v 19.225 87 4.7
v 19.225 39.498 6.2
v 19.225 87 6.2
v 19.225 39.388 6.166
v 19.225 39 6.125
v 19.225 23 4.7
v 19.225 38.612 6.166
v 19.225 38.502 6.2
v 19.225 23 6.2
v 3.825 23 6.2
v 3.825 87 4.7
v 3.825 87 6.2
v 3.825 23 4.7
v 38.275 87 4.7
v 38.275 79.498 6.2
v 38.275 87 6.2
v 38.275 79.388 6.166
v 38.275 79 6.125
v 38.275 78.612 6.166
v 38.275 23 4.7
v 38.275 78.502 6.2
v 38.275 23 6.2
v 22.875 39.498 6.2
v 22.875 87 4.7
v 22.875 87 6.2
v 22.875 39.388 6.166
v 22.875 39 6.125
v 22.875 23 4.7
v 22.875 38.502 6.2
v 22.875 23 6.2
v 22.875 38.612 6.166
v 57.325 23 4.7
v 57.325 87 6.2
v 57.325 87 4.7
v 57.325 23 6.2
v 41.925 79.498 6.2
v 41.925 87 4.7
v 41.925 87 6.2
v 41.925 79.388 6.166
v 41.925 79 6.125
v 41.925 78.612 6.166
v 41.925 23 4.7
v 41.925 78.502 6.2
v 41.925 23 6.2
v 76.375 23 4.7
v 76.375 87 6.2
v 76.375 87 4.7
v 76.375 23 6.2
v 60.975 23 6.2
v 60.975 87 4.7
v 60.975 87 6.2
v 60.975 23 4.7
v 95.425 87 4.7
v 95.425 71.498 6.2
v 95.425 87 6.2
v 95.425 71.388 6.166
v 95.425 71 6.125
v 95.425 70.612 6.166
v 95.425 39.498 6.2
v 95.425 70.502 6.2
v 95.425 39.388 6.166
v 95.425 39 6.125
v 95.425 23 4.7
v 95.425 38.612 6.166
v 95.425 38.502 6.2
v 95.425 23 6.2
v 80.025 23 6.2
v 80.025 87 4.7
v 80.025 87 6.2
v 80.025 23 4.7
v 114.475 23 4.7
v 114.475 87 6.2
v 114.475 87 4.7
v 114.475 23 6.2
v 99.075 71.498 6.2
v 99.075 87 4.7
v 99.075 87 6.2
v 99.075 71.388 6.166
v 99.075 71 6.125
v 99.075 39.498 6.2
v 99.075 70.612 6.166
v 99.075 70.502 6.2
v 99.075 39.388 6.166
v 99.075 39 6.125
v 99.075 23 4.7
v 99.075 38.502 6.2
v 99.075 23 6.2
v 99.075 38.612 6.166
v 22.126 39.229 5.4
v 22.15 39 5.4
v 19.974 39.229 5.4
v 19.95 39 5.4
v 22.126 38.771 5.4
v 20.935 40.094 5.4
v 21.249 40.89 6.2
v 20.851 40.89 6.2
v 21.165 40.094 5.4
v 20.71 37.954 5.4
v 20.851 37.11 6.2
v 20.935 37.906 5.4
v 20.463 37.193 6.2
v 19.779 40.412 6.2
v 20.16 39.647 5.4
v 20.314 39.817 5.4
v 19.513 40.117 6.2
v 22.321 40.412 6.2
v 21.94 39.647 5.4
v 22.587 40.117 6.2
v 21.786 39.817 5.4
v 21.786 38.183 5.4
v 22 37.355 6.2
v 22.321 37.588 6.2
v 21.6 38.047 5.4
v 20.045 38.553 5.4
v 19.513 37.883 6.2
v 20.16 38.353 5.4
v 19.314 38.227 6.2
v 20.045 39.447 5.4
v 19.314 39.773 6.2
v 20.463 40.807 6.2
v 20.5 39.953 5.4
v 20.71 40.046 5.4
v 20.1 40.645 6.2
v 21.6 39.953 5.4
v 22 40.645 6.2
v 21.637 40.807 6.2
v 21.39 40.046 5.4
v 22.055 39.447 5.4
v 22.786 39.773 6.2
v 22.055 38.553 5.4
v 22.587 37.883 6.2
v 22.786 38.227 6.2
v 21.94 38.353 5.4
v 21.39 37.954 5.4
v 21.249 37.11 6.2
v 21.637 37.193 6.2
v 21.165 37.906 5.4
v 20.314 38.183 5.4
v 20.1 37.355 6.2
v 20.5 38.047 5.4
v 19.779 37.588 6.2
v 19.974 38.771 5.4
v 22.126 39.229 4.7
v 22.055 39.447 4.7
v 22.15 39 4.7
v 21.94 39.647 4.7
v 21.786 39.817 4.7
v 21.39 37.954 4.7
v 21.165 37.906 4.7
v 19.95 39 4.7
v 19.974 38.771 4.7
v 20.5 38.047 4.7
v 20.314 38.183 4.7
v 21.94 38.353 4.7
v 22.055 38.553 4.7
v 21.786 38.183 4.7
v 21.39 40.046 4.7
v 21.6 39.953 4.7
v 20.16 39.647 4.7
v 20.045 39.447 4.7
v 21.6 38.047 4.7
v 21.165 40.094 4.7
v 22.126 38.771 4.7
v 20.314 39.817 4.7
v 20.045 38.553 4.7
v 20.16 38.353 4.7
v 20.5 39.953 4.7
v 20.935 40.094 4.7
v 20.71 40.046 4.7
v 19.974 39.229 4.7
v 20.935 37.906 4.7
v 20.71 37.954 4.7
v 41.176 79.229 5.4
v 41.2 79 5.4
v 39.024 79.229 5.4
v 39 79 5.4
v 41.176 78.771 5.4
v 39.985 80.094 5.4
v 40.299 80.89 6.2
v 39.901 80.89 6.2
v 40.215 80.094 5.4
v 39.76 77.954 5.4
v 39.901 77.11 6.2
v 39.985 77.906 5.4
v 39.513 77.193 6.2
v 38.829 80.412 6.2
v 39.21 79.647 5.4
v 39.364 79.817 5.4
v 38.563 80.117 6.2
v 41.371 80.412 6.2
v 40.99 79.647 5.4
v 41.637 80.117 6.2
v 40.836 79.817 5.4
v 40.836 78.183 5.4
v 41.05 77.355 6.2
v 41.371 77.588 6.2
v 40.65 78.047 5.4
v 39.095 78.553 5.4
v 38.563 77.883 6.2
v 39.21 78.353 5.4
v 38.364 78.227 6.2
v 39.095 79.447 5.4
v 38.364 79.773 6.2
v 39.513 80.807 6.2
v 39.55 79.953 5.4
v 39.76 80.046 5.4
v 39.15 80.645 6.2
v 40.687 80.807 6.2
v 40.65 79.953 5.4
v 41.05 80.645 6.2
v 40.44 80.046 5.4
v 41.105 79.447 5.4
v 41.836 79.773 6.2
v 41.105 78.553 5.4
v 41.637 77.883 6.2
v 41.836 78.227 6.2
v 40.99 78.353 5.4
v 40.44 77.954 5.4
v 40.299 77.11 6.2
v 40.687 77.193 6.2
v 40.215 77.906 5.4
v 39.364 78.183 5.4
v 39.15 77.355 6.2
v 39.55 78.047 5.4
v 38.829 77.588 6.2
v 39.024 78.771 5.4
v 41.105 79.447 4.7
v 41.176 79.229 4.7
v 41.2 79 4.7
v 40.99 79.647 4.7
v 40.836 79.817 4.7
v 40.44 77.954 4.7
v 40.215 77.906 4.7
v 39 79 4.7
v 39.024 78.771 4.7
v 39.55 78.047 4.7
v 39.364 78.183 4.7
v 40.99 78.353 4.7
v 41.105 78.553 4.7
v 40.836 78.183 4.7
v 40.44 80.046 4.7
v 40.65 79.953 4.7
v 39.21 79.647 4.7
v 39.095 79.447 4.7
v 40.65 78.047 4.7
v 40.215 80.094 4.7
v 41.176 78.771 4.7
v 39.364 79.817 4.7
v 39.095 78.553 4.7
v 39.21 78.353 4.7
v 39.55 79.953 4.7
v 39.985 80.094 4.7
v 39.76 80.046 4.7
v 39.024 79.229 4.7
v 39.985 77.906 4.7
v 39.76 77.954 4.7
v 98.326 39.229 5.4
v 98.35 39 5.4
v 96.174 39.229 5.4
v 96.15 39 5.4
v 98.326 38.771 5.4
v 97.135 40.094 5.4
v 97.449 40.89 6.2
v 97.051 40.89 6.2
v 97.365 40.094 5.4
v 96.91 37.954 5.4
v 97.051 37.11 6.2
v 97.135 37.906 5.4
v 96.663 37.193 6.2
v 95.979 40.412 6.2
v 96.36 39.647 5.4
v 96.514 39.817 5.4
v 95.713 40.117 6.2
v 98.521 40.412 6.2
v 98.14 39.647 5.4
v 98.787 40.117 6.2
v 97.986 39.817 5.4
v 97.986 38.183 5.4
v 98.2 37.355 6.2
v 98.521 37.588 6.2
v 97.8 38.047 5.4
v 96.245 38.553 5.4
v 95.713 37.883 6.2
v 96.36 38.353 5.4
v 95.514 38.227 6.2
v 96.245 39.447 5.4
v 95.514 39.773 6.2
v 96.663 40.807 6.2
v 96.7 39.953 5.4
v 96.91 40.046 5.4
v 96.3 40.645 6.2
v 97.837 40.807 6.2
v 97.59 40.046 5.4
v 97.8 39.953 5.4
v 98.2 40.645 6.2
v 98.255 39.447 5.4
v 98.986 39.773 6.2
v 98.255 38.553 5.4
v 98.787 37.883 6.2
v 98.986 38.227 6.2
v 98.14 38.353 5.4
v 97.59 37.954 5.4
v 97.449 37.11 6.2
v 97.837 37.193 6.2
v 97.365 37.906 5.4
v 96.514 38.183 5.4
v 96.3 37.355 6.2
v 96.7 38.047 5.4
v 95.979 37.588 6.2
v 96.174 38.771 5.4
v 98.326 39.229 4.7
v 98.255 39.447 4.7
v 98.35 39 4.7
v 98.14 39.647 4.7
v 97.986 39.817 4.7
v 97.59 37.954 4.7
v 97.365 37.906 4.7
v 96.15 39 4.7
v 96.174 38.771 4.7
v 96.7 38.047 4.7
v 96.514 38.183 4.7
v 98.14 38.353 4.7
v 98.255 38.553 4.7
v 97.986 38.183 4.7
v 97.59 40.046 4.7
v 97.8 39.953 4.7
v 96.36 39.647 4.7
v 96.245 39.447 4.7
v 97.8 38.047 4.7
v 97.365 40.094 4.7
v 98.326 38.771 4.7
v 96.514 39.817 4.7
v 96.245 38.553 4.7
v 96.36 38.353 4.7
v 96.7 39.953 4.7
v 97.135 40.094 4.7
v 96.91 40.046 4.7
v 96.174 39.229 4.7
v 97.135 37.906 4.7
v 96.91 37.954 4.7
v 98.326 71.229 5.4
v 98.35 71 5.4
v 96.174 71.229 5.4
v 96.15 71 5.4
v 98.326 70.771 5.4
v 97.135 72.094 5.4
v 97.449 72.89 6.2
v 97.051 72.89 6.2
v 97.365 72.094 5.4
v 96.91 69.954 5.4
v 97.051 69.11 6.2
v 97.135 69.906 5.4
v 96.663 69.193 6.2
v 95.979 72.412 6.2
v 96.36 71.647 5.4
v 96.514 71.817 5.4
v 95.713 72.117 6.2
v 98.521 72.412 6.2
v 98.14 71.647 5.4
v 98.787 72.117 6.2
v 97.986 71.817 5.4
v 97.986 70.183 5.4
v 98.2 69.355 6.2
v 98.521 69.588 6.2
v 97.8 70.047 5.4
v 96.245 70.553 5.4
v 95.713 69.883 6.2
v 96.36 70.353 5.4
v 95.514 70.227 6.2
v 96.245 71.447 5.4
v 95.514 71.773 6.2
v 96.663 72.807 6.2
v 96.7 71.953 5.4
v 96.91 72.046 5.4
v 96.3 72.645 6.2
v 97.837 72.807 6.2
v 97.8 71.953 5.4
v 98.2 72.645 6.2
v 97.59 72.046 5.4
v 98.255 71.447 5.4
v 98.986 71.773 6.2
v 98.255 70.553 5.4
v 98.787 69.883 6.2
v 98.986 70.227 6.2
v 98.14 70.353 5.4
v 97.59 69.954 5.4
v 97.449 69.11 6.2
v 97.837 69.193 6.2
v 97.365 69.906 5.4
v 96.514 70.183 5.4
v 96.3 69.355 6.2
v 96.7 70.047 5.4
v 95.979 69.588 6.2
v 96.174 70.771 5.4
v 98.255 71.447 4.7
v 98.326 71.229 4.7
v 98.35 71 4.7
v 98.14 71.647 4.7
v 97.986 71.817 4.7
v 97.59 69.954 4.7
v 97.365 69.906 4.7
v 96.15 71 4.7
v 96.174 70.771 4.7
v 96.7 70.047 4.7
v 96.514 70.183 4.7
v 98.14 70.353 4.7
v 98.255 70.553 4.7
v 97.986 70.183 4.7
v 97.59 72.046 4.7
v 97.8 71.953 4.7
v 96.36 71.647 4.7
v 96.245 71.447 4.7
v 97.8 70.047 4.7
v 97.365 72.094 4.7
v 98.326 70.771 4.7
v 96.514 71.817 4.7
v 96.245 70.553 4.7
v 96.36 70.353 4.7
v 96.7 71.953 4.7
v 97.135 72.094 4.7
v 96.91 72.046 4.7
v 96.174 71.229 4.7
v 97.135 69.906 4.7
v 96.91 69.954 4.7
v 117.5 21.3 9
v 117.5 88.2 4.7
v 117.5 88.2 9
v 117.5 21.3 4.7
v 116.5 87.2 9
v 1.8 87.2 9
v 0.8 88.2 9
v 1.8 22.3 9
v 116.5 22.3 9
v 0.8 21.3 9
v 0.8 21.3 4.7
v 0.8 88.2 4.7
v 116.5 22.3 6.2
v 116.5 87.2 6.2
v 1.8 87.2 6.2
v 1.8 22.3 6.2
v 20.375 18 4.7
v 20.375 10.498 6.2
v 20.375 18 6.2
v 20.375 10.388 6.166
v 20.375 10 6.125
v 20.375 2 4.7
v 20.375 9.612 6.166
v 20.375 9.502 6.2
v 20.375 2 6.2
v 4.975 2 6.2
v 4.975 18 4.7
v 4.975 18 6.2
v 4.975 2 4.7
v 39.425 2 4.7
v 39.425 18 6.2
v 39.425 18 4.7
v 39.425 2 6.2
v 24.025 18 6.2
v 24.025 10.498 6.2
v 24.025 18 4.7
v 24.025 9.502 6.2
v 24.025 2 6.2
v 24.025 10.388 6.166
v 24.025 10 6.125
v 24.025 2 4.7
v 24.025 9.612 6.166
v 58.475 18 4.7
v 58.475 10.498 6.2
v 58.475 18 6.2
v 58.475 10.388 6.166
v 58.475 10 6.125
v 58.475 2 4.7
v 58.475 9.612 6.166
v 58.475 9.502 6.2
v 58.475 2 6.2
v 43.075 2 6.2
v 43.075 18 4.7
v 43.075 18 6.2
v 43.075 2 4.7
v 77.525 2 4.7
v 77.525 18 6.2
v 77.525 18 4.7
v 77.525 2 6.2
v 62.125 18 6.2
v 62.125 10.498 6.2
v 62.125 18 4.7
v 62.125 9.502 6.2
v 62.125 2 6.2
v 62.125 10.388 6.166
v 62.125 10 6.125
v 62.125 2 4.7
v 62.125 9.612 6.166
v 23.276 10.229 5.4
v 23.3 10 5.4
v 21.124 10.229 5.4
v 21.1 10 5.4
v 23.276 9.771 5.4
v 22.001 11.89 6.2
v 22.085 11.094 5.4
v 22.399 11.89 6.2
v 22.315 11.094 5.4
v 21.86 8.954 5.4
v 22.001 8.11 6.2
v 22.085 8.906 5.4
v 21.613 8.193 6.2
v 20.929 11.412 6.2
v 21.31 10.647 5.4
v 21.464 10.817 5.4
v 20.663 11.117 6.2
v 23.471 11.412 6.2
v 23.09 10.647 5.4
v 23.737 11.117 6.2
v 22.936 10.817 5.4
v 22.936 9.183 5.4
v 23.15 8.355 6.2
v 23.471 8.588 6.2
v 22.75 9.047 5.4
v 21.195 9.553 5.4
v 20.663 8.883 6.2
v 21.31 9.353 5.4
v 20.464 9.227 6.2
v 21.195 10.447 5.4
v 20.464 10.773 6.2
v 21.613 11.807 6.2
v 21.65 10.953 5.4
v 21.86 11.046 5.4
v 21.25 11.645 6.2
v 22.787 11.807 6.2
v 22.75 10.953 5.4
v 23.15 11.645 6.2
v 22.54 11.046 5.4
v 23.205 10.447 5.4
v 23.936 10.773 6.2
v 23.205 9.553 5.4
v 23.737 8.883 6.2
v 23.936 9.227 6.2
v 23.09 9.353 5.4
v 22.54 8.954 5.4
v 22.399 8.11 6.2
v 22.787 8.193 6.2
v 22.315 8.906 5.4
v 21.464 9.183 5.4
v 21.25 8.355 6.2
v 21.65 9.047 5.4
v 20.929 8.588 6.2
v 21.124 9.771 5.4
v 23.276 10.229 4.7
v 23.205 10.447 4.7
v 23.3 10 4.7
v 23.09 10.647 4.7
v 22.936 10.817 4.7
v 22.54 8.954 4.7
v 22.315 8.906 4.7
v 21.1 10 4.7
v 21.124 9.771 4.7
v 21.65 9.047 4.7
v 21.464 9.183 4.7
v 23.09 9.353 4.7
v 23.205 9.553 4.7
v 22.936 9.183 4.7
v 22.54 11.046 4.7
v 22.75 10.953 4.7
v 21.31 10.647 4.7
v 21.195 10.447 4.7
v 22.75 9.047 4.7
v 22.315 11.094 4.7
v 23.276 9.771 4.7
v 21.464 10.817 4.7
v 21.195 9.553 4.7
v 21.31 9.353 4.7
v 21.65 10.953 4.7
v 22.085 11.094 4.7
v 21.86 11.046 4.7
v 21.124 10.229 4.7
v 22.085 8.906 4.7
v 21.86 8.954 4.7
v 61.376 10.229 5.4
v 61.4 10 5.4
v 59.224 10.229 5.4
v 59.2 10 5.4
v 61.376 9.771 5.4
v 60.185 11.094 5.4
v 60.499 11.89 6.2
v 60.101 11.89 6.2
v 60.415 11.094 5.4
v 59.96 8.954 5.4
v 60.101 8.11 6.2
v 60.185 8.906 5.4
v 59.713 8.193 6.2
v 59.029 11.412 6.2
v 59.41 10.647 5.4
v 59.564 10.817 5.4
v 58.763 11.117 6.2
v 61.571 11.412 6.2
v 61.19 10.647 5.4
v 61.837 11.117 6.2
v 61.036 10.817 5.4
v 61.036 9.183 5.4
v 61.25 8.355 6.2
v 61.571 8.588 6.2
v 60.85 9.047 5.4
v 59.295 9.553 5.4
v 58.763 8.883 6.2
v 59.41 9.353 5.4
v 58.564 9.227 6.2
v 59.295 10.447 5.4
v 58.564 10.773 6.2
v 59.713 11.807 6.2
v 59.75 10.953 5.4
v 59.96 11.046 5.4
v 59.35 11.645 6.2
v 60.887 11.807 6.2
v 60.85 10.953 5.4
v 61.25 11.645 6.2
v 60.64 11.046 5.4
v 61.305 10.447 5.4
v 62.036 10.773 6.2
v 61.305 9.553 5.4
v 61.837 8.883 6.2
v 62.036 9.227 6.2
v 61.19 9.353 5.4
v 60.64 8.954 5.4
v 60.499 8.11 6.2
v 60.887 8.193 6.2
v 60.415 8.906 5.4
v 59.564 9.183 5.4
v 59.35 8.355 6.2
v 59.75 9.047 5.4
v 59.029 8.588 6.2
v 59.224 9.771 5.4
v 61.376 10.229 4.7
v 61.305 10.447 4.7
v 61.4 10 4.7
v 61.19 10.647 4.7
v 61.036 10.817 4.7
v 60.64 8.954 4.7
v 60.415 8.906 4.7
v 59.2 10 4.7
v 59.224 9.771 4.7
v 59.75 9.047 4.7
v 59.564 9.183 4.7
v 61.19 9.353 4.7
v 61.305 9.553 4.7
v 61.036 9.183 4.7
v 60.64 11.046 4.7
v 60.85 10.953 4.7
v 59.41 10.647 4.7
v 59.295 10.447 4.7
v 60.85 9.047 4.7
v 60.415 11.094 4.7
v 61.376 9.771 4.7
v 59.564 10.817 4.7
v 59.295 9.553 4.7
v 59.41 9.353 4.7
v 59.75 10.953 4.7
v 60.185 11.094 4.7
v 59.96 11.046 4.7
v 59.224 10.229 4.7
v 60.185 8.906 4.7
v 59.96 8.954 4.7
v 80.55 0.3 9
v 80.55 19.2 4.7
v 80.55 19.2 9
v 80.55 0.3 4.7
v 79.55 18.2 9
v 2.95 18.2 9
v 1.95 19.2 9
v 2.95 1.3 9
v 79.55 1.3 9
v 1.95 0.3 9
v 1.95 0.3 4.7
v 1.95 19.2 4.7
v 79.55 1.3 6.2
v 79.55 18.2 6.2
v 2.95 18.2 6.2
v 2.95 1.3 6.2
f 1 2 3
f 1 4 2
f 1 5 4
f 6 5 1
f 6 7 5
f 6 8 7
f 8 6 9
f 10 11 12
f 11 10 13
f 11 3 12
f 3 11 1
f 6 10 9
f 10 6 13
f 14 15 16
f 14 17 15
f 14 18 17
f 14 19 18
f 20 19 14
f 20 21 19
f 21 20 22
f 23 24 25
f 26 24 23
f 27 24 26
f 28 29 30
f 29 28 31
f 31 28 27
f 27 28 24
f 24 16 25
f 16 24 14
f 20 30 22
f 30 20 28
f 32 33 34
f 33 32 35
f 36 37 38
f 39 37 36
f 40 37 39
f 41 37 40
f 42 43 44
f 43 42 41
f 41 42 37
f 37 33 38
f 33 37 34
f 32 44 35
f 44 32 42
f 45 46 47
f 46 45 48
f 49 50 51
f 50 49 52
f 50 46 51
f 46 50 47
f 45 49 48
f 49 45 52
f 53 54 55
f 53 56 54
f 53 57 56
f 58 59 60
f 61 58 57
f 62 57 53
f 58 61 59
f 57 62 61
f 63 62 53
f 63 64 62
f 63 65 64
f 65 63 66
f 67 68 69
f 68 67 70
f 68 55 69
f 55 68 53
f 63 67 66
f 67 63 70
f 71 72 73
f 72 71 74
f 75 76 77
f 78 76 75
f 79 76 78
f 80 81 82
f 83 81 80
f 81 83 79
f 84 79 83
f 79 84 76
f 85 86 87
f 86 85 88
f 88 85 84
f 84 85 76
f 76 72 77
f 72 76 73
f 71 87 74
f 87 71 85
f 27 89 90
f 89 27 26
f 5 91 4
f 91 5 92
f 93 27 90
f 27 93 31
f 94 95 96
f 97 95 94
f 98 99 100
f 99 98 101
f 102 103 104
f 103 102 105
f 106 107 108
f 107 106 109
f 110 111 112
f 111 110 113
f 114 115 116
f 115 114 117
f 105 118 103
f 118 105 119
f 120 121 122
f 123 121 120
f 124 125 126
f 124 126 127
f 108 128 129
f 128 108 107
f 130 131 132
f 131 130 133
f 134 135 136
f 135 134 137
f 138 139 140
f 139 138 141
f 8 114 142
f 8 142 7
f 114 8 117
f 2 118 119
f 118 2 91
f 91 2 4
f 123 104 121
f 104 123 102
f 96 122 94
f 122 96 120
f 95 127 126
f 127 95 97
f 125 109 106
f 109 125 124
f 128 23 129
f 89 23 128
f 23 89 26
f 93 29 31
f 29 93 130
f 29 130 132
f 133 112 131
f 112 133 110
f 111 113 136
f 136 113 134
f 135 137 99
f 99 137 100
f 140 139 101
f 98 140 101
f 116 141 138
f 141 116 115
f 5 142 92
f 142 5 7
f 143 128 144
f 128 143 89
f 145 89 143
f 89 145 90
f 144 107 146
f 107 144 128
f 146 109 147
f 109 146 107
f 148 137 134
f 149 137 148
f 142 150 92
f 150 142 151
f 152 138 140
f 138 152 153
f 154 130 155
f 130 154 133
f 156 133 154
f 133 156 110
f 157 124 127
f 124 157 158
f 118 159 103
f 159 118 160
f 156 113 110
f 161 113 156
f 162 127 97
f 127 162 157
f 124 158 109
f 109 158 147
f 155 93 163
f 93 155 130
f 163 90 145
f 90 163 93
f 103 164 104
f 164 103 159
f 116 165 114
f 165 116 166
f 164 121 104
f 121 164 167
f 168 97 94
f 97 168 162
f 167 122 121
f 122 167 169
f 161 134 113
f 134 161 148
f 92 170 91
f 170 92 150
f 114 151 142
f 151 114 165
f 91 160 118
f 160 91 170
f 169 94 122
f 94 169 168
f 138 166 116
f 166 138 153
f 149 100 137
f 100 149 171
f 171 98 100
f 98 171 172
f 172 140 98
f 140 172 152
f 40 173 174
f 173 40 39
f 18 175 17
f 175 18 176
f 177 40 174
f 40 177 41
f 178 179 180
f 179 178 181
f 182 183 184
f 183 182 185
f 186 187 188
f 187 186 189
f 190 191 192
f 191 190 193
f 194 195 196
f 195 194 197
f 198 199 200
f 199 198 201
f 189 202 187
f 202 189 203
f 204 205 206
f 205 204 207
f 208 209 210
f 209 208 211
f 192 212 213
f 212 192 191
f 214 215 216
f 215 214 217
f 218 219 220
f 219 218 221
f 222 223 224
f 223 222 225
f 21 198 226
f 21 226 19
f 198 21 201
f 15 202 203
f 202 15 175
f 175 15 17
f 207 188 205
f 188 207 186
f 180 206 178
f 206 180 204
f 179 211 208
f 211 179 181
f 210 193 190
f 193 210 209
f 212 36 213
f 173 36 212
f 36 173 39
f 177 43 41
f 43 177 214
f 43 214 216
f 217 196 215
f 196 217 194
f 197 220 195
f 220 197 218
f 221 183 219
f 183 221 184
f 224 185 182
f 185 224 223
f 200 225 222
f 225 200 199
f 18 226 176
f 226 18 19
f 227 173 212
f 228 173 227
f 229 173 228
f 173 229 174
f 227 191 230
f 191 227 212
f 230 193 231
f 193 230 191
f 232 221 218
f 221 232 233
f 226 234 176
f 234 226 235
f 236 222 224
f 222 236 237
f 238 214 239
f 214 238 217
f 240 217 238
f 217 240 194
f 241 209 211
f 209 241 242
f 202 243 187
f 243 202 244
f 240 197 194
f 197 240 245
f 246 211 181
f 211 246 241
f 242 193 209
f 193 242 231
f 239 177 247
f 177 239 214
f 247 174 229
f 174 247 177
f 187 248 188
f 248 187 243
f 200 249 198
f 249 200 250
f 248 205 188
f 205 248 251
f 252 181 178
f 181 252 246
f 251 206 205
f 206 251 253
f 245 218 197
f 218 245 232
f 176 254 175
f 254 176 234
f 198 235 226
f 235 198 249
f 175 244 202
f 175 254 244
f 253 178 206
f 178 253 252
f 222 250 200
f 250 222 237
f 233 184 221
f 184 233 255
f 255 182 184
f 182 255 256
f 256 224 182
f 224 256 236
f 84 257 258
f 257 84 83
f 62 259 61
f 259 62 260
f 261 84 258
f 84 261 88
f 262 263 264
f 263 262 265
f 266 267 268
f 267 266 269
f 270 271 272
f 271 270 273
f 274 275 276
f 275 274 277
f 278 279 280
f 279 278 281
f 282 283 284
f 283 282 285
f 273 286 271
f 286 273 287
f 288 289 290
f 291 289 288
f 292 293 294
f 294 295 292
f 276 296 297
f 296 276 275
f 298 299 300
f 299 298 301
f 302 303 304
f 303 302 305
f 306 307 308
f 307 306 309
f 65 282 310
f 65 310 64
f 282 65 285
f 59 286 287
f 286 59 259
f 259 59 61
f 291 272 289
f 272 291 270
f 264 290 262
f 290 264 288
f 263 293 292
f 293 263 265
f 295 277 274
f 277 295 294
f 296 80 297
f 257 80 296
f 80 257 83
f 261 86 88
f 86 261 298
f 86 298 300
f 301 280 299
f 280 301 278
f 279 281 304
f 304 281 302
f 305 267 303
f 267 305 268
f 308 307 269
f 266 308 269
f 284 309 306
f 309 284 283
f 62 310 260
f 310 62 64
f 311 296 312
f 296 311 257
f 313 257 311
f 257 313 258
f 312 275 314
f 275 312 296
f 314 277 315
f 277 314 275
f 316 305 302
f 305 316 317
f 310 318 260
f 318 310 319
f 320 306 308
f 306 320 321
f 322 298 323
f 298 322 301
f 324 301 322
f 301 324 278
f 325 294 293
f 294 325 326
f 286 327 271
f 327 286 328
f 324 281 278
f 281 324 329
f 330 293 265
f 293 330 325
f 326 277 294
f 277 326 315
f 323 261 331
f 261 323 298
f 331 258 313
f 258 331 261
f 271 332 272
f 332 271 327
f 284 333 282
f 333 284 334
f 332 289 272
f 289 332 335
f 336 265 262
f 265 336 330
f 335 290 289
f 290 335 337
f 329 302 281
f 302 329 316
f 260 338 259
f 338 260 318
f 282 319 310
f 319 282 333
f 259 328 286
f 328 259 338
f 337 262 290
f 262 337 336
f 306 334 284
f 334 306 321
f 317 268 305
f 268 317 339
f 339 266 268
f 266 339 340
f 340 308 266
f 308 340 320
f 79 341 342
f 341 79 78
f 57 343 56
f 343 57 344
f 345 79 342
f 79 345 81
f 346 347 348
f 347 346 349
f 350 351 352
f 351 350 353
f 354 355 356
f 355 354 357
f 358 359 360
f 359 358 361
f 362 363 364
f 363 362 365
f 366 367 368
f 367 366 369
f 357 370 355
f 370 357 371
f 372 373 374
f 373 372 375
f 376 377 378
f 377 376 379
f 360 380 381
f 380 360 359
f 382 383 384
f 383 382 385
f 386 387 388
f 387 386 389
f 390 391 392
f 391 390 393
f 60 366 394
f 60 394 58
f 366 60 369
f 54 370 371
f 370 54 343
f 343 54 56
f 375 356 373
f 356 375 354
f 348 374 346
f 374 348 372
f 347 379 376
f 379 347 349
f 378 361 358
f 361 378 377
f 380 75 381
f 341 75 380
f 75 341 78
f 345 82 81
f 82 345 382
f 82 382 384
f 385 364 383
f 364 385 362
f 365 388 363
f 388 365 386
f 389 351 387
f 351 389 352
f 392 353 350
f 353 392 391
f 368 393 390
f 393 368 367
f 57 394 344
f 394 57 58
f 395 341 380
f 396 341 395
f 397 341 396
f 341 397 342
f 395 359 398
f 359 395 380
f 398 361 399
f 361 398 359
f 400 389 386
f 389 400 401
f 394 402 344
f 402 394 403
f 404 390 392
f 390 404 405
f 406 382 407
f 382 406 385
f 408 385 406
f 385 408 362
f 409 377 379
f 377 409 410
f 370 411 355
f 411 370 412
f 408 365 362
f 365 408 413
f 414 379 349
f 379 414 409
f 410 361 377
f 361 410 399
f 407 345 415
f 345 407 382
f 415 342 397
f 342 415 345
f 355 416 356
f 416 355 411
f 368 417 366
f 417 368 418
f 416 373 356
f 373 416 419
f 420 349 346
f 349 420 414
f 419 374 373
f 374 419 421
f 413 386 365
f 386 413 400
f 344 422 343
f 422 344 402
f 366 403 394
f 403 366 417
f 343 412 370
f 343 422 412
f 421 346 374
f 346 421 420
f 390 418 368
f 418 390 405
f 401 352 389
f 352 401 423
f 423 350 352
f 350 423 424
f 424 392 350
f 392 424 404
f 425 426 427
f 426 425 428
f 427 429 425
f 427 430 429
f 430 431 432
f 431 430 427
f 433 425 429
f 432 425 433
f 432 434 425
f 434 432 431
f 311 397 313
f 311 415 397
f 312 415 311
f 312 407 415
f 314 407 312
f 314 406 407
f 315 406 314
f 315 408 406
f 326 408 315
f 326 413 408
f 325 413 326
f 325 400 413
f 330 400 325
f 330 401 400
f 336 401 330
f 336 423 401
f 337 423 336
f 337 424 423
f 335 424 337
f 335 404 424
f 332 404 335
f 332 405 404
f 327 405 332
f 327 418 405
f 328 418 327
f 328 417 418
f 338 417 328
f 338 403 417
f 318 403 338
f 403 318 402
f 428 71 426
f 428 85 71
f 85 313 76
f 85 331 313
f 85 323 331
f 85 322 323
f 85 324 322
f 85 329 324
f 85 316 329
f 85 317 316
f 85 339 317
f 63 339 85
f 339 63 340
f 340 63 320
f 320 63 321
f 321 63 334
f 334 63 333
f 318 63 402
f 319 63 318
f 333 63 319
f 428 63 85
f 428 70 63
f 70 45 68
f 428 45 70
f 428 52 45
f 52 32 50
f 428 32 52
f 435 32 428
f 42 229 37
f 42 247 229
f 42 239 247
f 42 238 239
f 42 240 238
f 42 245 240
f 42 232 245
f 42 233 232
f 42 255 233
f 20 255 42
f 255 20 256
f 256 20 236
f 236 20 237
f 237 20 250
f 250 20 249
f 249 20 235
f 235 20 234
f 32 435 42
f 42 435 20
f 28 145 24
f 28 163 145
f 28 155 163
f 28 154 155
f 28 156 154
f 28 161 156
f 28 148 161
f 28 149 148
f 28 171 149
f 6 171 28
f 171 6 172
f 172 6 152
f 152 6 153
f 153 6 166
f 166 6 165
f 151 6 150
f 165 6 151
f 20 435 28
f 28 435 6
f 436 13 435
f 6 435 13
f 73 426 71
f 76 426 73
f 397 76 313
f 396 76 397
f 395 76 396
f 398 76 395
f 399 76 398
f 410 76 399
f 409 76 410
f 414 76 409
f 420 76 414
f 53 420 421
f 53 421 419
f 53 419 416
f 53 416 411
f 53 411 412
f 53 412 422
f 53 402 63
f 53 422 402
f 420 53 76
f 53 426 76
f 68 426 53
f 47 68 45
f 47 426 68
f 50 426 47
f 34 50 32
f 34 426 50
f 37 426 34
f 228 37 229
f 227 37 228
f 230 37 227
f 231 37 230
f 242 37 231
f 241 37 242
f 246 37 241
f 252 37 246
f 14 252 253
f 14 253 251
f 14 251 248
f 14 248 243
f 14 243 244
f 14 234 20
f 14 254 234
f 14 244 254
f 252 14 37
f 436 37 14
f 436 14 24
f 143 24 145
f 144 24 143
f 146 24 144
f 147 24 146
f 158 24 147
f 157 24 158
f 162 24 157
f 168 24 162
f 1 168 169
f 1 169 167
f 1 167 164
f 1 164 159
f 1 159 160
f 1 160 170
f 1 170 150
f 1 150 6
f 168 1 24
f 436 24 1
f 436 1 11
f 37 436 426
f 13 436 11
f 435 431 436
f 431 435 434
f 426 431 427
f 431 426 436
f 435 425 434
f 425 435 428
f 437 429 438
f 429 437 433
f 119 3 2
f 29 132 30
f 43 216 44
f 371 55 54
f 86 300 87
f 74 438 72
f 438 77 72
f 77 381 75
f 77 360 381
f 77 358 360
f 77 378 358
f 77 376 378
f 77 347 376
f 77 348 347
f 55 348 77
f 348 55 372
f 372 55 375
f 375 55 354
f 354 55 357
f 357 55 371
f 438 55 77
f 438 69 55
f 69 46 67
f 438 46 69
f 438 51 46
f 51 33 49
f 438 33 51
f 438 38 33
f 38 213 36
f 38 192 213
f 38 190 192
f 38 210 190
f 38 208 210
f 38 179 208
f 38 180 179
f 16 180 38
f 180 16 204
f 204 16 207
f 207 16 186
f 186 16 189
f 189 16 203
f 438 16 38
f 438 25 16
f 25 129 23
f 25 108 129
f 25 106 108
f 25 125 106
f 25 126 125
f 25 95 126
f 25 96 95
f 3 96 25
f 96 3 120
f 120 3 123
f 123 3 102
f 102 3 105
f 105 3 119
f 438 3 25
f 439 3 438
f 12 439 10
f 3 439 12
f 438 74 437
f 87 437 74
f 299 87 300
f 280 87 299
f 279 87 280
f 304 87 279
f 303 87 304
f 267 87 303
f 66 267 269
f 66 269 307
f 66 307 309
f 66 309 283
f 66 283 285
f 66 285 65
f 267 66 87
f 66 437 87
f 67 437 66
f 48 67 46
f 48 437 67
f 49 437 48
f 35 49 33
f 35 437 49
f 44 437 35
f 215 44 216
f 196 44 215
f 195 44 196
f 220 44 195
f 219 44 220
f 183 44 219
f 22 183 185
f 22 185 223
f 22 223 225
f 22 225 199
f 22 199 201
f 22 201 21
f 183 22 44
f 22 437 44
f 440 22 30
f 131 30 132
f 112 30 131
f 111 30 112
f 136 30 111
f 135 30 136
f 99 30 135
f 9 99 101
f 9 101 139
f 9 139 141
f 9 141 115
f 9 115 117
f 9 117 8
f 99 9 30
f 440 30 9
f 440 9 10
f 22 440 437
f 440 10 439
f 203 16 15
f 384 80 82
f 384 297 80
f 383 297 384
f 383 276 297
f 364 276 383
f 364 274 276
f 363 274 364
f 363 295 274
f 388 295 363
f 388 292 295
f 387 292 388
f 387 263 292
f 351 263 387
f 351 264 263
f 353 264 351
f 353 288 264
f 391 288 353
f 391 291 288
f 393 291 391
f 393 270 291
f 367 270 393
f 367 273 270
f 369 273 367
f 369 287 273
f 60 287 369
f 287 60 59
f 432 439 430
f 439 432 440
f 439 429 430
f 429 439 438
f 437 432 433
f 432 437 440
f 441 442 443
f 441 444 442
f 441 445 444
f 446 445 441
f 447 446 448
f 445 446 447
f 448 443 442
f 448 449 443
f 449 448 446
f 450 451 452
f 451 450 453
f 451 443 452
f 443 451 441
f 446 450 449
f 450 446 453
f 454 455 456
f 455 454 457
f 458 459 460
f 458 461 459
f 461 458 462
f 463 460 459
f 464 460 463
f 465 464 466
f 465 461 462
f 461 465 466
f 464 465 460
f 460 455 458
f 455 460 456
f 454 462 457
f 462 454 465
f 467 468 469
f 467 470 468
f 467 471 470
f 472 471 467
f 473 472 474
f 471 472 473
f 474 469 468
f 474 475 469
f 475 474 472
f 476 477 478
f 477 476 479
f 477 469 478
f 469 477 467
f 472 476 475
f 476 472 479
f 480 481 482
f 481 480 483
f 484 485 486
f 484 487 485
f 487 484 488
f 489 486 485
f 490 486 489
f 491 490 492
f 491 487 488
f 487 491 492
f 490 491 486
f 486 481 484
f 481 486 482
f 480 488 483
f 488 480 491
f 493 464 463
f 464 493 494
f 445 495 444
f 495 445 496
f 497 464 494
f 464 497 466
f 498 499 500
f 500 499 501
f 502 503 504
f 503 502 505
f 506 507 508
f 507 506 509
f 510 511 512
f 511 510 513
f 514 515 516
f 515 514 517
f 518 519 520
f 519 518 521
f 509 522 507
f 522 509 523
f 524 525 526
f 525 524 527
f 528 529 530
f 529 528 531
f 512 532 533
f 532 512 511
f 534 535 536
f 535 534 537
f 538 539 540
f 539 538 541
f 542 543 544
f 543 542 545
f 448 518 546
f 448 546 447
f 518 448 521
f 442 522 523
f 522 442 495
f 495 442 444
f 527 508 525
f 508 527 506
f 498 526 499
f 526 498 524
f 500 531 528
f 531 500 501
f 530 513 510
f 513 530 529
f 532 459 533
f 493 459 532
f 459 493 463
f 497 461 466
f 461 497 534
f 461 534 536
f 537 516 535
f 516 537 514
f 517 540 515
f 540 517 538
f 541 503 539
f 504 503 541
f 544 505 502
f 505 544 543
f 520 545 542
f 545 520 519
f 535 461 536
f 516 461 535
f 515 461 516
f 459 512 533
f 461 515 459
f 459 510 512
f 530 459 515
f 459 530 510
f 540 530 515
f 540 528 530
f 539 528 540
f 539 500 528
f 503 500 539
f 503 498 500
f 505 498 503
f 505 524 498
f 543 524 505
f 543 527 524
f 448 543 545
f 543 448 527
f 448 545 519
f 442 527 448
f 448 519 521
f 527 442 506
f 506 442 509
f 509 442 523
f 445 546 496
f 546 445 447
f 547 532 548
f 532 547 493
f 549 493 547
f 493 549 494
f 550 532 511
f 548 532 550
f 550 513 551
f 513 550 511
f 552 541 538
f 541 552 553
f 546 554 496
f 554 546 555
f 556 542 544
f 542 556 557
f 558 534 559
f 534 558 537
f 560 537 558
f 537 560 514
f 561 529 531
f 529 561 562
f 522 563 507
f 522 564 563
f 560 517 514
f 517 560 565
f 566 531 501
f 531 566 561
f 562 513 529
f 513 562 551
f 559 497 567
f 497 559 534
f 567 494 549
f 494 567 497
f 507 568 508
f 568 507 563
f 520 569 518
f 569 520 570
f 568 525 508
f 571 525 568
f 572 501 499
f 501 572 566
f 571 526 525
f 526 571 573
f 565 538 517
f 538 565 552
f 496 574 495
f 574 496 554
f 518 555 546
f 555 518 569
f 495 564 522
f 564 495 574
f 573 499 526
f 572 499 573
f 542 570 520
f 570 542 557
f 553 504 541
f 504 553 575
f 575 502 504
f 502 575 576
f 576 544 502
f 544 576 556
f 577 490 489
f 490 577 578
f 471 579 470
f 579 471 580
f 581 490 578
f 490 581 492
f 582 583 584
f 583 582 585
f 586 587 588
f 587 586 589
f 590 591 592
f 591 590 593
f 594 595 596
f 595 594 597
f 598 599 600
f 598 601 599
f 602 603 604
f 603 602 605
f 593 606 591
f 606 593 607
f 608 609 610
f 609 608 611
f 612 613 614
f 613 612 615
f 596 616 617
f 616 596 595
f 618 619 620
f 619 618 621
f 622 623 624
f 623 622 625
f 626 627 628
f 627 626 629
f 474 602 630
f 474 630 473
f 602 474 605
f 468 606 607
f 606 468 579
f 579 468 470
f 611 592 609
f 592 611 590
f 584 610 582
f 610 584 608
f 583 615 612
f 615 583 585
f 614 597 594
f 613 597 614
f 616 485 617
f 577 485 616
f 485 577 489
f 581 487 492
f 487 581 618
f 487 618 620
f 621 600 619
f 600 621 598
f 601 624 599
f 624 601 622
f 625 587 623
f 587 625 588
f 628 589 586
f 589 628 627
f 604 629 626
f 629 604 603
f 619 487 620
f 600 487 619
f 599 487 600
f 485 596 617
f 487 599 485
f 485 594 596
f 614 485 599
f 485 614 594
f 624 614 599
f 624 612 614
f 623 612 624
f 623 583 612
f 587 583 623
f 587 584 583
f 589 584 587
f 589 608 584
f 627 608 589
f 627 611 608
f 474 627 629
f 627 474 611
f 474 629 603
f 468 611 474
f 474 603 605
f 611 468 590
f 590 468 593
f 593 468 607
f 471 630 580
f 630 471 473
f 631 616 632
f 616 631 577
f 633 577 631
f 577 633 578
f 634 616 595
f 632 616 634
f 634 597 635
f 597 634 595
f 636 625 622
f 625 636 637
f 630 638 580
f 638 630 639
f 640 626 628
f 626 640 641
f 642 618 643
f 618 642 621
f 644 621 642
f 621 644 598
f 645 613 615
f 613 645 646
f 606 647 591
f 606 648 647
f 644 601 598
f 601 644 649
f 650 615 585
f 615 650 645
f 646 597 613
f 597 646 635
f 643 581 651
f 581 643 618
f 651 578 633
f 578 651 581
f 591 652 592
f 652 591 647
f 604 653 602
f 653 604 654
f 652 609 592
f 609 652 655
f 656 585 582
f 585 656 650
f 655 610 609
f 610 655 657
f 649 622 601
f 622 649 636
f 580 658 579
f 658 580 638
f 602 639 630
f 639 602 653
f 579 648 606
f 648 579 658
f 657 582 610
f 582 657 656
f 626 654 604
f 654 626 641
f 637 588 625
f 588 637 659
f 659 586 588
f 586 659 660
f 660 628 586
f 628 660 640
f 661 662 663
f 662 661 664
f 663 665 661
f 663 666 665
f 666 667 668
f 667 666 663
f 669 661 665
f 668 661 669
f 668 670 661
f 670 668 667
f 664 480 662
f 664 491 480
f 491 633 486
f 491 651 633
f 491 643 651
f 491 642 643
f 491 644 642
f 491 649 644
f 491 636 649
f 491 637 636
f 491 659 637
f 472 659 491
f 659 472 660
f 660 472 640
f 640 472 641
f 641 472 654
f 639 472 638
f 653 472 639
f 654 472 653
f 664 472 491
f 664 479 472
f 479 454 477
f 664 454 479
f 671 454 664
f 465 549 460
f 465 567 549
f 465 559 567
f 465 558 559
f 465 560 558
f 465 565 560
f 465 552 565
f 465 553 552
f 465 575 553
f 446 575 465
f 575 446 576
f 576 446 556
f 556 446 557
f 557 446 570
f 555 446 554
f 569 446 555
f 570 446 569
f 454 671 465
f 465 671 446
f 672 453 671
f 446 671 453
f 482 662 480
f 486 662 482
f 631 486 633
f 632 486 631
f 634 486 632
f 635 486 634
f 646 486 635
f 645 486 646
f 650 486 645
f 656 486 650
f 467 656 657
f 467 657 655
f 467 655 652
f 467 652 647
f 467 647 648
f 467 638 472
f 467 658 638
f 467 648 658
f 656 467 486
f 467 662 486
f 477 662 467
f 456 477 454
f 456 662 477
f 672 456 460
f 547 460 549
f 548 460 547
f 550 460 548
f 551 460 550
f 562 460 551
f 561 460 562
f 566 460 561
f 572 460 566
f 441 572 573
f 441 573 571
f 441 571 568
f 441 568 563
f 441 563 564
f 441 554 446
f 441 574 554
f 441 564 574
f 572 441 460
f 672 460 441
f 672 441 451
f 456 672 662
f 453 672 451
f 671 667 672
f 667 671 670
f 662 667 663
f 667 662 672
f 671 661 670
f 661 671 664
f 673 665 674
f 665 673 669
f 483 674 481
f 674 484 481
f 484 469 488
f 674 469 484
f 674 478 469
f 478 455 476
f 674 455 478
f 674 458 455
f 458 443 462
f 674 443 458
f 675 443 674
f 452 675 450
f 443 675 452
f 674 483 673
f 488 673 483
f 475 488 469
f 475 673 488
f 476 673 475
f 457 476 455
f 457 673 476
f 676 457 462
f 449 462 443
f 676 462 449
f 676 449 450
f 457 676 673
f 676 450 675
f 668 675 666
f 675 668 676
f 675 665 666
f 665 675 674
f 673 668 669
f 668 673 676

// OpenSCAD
use <not_enough_compositions.scad>;

translate([2, -1]) case_alphanumeric();
translate([-54, 2]) case_thumb();
